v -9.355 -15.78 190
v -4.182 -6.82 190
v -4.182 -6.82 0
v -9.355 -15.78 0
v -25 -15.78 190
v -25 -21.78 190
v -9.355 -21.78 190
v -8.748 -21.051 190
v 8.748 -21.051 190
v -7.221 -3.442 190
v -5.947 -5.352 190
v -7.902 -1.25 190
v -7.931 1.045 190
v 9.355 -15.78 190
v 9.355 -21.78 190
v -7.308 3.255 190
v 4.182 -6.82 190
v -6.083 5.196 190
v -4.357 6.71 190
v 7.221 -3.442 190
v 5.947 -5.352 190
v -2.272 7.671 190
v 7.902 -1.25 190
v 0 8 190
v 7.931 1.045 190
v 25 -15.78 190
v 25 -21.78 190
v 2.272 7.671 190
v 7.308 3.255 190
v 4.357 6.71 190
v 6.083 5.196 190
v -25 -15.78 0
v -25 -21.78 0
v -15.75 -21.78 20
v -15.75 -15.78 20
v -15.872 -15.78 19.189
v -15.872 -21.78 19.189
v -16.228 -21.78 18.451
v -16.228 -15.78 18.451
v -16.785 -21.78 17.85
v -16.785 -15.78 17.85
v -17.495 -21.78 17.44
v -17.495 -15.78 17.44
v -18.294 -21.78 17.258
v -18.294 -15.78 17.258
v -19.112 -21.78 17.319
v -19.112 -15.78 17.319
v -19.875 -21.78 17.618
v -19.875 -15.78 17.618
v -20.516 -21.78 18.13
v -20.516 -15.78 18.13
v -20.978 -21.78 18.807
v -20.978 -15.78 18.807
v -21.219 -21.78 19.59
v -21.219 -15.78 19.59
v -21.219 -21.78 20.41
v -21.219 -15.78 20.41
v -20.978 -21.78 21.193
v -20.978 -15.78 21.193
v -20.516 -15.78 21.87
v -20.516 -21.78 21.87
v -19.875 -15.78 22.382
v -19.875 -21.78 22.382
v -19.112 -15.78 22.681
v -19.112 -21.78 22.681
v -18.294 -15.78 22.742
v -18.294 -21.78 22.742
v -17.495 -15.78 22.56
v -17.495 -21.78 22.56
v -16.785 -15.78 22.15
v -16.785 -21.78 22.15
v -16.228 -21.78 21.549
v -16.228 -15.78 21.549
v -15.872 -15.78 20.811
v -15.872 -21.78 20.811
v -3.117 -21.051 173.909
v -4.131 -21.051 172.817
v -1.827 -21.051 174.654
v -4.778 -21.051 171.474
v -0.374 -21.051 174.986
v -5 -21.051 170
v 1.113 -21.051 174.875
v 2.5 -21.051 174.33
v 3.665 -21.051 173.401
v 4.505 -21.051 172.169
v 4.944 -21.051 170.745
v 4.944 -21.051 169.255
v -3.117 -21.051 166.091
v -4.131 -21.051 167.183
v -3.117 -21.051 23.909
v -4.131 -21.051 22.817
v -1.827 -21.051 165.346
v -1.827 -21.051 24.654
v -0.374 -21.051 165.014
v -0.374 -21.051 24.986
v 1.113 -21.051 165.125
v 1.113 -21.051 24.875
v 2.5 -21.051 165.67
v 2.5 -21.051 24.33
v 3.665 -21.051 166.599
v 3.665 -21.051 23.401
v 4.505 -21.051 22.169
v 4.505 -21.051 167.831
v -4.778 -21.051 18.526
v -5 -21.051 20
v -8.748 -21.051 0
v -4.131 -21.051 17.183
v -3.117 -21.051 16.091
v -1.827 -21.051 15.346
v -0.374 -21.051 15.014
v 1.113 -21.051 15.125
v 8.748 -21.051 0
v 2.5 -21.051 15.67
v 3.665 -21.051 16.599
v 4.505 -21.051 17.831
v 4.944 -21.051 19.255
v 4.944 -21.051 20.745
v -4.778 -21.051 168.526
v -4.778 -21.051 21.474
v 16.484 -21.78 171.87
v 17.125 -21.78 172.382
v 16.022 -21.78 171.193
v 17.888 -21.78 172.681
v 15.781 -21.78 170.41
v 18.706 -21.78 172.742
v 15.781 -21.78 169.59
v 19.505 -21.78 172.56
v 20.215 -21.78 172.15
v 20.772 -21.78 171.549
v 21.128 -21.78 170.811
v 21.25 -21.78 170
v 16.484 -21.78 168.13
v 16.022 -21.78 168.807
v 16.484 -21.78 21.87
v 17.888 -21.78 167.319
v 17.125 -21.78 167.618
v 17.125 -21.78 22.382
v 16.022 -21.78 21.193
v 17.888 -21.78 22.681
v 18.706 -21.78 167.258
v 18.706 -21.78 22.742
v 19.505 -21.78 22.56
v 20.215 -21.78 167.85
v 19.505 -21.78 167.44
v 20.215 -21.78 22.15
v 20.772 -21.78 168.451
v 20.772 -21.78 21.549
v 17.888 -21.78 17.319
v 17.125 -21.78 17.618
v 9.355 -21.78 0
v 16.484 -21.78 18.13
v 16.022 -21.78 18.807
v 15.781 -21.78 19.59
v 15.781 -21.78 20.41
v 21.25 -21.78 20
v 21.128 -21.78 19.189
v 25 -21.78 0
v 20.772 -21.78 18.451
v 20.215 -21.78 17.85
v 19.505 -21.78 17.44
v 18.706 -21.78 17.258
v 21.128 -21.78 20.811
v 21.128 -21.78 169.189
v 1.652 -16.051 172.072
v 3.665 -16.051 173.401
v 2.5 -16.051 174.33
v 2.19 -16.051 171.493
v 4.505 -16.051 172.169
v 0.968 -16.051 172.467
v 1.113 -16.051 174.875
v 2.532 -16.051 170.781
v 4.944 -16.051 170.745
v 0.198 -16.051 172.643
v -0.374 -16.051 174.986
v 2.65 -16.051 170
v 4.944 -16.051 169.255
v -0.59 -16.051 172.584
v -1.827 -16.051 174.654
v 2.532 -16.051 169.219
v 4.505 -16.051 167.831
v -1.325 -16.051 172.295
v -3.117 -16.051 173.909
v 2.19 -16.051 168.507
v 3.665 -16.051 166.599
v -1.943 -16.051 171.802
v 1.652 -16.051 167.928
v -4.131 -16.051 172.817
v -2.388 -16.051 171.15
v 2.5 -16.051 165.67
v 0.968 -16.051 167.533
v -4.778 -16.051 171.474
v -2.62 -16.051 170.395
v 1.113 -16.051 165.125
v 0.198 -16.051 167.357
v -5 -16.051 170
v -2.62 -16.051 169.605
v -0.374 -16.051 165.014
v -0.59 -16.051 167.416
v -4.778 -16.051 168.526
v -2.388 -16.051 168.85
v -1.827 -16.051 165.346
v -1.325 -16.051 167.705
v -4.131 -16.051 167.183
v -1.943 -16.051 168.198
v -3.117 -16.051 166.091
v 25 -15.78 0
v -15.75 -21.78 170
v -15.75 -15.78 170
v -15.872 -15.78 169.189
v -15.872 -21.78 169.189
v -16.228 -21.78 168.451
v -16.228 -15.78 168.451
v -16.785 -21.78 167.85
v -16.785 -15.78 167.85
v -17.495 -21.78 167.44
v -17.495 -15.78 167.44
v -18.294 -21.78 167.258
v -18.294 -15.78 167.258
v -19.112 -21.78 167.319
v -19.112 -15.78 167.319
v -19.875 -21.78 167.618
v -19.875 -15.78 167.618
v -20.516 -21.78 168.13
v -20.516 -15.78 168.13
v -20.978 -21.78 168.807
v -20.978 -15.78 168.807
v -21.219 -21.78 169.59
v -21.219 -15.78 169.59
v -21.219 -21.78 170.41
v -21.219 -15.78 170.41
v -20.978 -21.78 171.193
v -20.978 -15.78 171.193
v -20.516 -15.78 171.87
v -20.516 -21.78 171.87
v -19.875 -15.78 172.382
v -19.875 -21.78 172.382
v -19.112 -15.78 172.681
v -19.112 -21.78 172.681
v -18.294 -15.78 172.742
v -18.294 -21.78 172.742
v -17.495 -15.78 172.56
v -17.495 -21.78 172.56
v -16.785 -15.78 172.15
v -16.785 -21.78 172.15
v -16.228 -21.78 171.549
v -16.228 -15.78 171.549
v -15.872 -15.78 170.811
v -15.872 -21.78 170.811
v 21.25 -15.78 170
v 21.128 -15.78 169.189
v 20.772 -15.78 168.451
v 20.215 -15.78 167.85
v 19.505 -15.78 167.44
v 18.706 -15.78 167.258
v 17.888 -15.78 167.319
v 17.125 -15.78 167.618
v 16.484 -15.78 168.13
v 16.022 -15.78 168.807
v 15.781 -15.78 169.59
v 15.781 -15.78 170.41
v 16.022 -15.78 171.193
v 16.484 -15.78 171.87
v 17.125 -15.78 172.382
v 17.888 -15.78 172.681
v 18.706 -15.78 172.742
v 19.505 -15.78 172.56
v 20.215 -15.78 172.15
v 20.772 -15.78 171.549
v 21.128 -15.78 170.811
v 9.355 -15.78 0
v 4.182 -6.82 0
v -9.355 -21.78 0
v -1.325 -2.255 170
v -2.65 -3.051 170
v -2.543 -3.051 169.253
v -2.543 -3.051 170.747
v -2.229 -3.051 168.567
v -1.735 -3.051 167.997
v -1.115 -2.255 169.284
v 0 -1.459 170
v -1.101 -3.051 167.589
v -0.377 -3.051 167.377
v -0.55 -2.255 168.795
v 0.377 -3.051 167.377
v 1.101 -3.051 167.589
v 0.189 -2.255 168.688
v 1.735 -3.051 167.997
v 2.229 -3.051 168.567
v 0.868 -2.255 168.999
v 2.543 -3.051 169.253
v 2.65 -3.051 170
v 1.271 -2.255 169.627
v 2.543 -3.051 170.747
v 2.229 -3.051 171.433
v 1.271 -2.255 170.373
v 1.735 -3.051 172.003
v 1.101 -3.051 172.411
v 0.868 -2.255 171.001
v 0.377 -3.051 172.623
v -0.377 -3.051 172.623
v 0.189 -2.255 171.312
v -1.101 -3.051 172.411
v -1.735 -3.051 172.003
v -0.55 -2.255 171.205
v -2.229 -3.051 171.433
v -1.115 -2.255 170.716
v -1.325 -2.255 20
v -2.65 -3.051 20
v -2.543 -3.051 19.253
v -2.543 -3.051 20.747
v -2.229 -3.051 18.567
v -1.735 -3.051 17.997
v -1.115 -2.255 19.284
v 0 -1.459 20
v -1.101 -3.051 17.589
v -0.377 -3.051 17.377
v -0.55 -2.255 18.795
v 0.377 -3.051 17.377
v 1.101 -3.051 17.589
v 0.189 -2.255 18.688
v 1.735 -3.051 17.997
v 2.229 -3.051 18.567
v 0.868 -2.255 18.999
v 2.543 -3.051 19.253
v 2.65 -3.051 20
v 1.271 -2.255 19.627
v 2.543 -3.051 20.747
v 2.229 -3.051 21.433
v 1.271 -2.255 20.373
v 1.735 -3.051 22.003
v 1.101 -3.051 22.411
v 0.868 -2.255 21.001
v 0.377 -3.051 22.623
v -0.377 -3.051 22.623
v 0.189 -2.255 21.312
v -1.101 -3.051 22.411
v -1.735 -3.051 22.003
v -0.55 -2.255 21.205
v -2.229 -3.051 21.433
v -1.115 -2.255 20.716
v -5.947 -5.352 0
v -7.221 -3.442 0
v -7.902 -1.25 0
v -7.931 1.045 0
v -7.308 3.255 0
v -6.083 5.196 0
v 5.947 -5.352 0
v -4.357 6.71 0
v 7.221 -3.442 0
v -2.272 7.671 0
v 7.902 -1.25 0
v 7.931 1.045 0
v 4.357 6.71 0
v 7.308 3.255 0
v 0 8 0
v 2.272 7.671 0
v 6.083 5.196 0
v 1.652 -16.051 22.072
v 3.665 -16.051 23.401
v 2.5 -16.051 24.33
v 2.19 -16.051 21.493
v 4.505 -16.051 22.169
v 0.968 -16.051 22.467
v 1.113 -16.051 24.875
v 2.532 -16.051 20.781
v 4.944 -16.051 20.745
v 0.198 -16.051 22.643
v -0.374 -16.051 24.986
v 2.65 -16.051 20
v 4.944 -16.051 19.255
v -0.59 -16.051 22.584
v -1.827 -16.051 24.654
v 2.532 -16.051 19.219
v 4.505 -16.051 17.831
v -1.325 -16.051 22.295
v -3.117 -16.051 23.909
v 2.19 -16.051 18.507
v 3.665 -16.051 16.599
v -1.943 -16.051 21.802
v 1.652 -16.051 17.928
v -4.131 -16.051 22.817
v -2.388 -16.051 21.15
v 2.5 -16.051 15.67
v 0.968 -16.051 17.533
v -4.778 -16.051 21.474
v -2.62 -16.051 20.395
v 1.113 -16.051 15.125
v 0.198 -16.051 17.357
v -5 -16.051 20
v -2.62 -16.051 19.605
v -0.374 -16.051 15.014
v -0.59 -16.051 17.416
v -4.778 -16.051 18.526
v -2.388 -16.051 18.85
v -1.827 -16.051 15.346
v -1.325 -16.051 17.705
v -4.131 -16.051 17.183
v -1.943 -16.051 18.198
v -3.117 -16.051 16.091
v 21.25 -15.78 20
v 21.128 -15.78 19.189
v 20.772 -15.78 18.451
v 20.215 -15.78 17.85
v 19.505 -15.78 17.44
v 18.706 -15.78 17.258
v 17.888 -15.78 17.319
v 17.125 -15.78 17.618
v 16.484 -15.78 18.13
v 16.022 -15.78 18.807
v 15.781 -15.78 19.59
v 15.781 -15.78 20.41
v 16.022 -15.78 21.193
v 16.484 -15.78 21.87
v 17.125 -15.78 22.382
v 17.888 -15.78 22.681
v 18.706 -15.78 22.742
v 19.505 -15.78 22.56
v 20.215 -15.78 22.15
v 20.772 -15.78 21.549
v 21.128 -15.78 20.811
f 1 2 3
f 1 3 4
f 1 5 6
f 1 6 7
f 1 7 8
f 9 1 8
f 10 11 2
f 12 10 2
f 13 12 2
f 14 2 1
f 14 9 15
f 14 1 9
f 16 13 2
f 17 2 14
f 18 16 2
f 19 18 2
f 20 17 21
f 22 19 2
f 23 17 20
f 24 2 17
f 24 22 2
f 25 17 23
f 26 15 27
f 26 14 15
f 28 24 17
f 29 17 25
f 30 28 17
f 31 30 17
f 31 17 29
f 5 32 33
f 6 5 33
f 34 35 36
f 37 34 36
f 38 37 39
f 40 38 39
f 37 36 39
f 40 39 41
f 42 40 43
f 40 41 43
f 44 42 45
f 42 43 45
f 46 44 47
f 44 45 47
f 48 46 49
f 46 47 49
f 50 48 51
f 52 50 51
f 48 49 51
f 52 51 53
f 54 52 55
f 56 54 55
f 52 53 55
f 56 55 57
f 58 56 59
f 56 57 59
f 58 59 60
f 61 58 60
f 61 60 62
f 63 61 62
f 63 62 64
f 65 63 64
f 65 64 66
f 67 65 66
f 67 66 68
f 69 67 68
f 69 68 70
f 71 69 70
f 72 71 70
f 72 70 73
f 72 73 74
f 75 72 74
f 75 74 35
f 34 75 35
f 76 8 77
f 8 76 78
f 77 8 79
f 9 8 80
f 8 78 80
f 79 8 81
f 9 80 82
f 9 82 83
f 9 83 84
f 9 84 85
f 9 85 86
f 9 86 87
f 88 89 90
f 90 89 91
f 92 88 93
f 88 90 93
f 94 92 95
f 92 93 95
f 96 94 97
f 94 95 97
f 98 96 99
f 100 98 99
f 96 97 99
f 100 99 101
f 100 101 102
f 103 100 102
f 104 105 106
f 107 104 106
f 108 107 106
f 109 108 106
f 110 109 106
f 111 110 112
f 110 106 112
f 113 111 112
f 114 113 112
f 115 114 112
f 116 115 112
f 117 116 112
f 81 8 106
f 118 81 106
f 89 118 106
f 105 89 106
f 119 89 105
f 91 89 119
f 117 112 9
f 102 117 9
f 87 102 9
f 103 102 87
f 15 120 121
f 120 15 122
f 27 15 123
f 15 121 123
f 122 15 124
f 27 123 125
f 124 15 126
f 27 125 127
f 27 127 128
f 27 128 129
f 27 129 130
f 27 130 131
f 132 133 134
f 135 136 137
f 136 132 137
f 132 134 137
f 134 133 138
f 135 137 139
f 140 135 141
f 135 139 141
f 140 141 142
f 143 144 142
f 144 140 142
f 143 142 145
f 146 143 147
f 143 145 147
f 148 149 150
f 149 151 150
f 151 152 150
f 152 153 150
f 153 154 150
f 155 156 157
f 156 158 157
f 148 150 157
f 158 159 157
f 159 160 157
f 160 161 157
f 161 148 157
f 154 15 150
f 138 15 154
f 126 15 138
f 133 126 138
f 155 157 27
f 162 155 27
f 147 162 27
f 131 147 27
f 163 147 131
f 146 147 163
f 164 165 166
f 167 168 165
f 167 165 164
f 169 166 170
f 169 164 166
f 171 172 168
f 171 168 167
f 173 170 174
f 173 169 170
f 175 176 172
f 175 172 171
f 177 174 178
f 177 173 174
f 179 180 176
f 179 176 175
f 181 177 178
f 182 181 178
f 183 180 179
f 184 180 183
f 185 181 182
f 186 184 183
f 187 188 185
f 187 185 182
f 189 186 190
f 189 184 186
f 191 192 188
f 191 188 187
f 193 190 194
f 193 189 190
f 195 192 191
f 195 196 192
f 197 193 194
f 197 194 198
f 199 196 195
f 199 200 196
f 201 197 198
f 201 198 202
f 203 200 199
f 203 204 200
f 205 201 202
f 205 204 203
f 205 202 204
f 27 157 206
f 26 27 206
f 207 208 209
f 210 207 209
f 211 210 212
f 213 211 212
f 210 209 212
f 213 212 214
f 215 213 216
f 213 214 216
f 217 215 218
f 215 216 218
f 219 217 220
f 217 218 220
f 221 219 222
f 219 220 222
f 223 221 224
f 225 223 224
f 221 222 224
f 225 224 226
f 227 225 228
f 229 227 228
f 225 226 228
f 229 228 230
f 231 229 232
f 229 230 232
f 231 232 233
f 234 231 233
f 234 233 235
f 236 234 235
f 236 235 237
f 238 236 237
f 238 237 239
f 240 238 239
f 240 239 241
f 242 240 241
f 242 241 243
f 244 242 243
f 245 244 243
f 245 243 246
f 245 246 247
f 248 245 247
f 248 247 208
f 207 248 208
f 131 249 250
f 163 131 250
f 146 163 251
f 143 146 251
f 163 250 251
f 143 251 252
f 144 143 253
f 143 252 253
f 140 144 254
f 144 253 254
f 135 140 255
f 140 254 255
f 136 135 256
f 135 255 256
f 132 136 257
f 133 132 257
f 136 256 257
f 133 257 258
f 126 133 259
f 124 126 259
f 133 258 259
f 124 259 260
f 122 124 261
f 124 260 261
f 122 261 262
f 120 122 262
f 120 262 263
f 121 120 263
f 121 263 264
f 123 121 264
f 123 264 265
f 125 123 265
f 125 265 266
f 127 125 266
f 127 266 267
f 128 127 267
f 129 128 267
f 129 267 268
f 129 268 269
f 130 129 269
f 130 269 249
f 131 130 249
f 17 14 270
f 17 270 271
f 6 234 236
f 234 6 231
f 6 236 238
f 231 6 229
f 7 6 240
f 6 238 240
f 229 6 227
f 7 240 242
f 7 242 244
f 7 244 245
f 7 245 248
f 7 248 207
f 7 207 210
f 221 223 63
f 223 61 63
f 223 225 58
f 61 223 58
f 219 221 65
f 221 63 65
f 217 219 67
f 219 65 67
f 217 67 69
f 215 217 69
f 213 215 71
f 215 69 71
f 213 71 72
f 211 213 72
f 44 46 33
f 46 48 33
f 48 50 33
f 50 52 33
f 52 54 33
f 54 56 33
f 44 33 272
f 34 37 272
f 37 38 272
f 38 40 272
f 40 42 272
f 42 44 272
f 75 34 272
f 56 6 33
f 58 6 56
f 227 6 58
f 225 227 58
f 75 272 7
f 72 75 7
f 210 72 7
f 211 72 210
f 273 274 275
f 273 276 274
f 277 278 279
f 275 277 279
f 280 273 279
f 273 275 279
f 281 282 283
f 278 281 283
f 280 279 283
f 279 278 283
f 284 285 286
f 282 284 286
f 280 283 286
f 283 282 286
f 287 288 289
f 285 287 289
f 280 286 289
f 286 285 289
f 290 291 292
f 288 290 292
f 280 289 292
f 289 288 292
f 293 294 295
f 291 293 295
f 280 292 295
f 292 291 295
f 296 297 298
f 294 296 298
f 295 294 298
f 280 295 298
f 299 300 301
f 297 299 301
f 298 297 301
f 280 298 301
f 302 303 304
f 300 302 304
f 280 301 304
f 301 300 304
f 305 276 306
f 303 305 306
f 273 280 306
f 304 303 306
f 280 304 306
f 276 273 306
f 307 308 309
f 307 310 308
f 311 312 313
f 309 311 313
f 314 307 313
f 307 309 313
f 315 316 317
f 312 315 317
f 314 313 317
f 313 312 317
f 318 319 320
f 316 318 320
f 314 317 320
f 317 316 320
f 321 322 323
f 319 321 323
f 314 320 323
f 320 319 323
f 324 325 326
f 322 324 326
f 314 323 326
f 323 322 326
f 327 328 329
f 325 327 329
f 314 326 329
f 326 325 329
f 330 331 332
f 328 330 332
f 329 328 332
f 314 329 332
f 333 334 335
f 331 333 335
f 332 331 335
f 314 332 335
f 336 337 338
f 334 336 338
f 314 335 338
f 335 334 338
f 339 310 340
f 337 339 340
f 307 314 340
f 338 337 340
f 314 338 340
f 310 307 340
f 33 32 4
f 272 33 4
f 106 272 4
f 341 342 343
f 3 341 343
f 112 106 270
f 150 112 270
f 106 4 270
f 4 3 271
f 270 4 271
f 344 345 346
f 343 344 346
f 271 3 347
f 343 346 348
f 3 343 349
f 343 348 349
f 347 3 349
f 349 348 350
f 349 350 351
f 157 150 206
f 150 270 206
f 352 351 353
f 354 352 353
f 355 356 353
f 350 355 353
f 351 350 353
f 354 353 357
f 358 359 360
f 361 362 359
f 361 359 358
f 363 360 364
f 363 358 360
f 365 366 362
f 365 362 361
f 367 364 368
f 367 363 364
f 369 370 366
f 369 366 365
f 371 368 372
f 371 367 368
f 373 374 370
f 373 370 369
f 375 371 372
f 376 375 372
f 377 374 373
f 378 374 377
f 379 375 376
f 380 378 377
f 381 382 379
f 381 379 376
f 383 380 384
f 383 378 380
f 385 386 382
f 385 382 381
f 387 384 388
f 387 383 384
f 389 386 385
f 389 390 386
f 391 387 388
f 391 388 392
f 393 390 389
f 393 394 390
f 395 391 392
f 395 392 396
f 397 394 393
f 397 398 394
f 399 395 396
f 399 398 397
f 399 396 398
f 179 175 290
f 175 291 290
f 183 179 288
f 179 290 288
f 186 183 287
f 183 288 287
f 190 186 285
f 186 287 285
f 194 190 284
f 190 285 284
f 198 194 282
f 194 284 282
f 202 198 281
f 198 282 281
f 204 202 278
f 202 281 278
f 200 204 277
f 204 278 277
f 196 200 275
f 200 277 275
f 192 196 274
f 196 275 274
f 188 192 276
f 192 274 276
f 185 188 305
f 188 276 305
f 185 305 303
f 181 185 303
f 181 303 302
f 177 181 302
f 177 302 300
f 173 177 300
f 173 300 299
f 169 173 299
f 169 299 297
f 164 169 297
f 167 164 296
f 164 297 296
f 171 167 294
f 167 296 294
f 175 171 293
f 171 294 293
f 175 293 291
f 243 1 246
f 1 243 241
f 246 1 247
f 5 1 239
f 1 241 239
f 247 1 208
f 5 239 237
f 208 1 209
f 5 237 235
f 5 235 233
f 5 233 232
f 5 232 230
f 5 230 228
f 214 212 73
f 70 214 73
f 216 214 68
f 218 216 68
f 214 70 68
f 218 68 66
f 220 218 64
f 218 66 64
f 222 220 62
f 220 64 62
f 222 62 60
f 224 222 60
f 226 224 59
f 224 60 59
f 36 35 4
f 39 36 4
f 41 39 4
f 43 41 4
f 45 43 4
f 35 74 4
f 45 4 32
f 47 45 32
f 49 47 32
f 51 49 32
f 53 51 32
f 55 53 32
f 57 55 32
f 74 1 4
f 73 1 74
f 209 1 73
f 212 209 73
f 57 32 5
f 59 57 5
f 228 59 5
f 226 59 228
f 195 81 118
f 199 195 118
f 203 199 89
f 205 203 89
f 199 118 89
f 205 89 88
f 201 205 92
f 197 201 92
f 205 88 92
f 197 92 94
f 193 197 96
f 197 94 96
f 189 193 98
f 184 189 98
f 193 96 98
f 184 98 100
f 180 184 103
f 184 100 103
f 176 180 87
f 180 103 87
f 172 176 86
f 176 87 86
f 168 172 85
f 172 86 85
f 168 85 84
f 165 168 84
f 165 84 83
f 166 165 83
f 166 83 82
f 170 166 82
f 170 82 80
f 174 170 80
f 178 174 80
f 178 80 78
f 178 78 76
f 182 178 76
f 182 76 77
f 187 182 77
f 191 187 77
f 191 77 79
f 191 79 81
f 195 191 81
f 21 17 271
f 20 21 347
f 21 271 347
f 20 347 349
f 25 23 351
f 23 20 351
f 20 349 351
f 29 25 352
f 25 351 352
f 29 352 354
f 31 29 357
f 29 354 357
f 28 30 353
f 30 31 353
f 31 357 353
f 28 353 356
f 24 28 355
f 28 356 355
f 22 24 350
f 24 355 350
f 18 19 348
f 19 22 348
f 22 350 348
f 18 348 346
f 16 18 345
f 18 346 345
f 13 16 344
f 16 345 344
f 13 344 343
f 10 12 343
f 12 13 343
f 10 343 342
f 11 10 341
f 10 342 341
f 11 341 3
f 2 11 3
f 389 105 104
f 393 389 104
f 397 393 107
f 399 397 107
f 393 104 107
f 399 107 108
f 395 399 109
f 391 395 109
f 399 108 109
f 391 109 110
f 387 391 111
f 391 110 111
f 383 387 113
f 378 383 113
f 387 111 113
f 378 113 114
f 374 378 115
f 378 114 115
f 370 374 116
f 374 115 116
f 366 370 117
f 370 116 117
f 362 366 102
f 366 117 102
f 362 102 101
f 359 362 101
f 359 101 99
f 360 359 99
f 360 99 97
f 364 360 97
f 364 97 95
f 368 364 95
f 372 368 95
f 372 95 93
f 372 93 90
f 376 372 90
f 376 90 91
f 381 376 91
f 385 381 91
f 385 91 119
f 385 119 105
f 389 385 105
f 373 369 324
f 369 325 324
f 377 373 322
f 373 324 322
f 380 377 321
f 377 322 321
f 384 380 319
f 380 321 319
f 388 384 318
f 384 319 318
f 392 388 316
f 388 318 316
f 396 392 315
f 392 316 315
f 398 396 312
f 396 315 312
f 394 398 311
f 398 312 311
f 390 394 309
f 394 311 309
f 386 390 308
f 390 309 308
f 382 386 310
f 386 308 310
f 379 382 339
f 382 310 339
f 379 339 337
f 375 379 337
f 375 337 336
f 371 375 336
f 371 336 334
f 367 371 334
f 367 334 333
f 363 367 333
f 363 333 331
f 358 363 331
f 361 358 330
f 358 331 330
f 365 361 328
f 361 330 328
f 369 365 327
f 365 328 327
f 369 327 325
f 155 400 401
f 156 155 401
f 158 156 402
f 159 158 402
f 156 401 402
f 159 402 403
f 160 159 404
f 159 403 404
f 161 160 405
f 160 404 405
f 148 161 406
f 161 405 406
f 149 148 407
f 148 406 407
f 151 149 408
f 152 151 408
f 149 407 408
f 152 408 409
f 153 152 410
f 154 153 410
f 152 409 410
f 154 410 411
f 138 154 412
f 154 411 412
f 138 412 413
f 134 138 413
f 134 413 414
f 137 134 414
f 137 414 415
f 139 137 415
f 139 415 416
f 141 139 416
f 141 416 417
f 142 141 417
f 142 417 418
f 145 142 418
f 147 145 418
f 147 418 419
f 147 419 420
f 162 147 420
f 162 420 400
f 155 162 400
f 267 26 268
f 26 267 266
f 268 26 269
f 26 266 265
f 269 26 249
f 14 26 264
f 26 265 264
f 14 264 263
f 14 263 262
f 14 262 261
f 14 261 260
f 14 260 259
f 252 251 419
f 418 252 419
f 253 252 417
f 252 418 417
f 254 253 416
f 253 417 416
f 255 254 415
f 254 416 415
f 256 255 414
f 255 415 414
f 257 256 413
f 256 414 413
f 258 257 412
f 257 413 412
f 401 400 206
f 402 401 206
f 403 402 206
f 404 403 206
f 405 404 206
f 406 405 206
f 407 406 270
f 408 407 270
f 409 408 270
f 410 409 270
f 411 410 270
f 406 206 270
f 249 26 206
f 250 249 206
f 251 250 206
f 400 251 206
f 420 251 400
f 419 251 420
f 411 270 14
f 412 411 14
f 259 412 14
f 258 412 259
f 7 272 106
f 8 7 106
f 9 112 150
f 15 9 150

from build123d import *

# Parameters (mm, degrees)
SKETCH_2_R                  = 8
EXTRUDE_2_DEPTH             = 190
EXTRUDE_3_DEPTH             = 190
SKETCH_7_R                  = 2.75
CUT_EXTRUDE_1_DEPTH         = 7
HOLE_WIZARD_M51_D           = 5.3
HOLE_WIZARD_M51_DEPTH       = 18
HOLE_WIZARD_M51_CBORE_D     = 10
HOLE_WIZARD_M51_CBORE_DEPTH = 5
HOLE_WIZARD_M51_TIP         = 1.59228064


with BuildPart() as part:
    # Эскиз2 → Бобышка-Вытянуть2 (new body)
    with BuildSketch(Plane.XY):
        Circle(SKETCH_2_R)
    extrude(amount=EXTRUDE_2_DEPTH)

    # Эскиз2<4> → Бобышка-Вытянуть3 (add)
    with BuildSketch(Plane.XY):
        with BuildLine():
            Line((9.355, -15.779924087), (4.181941588, -6.819924087))
            ThreePointArc((4.181941588, -6.819924087), (0, -8), (-4.181941588, -6.819924087))
            Line((-4.181941588, -6.819924087), (-9.355, -15.779924087))
            Line((-9.355, -15.779924087), (-25, -15.779924087))
            Line((-25, -15.779924087), (-25, -21.779924087))
            Line((-25, -21.779924087), (-9.355, -21.779924087))
            Line((-9.355, -21.779924087), (-8.748067357, -21.051410397))
            Line((-8.748067357, -21.051410397), (8.748067357, -21.051410397))
            Line((8.748067357, -21.051410397), (9.355, -21.779924087))
            Line((9.355, -21.779924087), (25, -21.779924087))
            Line((25, -21.779924087), (25, -15.779924087))
            Line((25, -15.779924087), (9.355, -15.779924087))
        make_face()
    extrude(amount=EXTRUDE_3_DEPTH)

    # Эскиз7 → Вырез-Вытянуть1 (cut, through all)
    with BuildSketch(Plane(origin=(0, -15.779924087, 0), x_dir=(1, 0, 0), z_dir=(0, 1, 0))):
        with Locations((-18.5, -170)):
            Circle(SKETCH_7_R)
        with Locations((18.5, -170)):
            Circle(SKETCH_7_R)
        with Locations((18.5, -20)):
            Circle(SKETCH_7_R)
        with Locations((-18.5, -20)):
            Circle(SKETCH_7_R)
    extrude(amount=-CUT_EXTRUDE_1_DEPTH, mode=Mode.SUBTRACT)

    # Цековка для винта с внутренним шестигранником M51
    with Locations(Plane(origin=(0, -21.051410397, 0), x_dir=(-1, 0, 0), z_dir=(0, -1, 0))):
        with Locations((0, -20), (0, -170)):
            CounterBoreHole(HOLE_WIZARD_M51_D / 2, HOLE_WIZARD_M51_CBORE_D / 2, HOLE_WIZARD_M51_CBORE_DEPTH, depth=HOLE_WIZARD_M51_DEPTH)
            with Locations((0, 0, -(HOLE_WIZARD_M51_DEPTH + HOLE_WIZARD_M51_TIP / 2))):  # 118° drill point
                Cone(0, HOLE_WIZARD_M51_D / 2, HOLE_WIZARD_M51_TIP, mode=Mode.SUBTRACT)


solid = part.part
